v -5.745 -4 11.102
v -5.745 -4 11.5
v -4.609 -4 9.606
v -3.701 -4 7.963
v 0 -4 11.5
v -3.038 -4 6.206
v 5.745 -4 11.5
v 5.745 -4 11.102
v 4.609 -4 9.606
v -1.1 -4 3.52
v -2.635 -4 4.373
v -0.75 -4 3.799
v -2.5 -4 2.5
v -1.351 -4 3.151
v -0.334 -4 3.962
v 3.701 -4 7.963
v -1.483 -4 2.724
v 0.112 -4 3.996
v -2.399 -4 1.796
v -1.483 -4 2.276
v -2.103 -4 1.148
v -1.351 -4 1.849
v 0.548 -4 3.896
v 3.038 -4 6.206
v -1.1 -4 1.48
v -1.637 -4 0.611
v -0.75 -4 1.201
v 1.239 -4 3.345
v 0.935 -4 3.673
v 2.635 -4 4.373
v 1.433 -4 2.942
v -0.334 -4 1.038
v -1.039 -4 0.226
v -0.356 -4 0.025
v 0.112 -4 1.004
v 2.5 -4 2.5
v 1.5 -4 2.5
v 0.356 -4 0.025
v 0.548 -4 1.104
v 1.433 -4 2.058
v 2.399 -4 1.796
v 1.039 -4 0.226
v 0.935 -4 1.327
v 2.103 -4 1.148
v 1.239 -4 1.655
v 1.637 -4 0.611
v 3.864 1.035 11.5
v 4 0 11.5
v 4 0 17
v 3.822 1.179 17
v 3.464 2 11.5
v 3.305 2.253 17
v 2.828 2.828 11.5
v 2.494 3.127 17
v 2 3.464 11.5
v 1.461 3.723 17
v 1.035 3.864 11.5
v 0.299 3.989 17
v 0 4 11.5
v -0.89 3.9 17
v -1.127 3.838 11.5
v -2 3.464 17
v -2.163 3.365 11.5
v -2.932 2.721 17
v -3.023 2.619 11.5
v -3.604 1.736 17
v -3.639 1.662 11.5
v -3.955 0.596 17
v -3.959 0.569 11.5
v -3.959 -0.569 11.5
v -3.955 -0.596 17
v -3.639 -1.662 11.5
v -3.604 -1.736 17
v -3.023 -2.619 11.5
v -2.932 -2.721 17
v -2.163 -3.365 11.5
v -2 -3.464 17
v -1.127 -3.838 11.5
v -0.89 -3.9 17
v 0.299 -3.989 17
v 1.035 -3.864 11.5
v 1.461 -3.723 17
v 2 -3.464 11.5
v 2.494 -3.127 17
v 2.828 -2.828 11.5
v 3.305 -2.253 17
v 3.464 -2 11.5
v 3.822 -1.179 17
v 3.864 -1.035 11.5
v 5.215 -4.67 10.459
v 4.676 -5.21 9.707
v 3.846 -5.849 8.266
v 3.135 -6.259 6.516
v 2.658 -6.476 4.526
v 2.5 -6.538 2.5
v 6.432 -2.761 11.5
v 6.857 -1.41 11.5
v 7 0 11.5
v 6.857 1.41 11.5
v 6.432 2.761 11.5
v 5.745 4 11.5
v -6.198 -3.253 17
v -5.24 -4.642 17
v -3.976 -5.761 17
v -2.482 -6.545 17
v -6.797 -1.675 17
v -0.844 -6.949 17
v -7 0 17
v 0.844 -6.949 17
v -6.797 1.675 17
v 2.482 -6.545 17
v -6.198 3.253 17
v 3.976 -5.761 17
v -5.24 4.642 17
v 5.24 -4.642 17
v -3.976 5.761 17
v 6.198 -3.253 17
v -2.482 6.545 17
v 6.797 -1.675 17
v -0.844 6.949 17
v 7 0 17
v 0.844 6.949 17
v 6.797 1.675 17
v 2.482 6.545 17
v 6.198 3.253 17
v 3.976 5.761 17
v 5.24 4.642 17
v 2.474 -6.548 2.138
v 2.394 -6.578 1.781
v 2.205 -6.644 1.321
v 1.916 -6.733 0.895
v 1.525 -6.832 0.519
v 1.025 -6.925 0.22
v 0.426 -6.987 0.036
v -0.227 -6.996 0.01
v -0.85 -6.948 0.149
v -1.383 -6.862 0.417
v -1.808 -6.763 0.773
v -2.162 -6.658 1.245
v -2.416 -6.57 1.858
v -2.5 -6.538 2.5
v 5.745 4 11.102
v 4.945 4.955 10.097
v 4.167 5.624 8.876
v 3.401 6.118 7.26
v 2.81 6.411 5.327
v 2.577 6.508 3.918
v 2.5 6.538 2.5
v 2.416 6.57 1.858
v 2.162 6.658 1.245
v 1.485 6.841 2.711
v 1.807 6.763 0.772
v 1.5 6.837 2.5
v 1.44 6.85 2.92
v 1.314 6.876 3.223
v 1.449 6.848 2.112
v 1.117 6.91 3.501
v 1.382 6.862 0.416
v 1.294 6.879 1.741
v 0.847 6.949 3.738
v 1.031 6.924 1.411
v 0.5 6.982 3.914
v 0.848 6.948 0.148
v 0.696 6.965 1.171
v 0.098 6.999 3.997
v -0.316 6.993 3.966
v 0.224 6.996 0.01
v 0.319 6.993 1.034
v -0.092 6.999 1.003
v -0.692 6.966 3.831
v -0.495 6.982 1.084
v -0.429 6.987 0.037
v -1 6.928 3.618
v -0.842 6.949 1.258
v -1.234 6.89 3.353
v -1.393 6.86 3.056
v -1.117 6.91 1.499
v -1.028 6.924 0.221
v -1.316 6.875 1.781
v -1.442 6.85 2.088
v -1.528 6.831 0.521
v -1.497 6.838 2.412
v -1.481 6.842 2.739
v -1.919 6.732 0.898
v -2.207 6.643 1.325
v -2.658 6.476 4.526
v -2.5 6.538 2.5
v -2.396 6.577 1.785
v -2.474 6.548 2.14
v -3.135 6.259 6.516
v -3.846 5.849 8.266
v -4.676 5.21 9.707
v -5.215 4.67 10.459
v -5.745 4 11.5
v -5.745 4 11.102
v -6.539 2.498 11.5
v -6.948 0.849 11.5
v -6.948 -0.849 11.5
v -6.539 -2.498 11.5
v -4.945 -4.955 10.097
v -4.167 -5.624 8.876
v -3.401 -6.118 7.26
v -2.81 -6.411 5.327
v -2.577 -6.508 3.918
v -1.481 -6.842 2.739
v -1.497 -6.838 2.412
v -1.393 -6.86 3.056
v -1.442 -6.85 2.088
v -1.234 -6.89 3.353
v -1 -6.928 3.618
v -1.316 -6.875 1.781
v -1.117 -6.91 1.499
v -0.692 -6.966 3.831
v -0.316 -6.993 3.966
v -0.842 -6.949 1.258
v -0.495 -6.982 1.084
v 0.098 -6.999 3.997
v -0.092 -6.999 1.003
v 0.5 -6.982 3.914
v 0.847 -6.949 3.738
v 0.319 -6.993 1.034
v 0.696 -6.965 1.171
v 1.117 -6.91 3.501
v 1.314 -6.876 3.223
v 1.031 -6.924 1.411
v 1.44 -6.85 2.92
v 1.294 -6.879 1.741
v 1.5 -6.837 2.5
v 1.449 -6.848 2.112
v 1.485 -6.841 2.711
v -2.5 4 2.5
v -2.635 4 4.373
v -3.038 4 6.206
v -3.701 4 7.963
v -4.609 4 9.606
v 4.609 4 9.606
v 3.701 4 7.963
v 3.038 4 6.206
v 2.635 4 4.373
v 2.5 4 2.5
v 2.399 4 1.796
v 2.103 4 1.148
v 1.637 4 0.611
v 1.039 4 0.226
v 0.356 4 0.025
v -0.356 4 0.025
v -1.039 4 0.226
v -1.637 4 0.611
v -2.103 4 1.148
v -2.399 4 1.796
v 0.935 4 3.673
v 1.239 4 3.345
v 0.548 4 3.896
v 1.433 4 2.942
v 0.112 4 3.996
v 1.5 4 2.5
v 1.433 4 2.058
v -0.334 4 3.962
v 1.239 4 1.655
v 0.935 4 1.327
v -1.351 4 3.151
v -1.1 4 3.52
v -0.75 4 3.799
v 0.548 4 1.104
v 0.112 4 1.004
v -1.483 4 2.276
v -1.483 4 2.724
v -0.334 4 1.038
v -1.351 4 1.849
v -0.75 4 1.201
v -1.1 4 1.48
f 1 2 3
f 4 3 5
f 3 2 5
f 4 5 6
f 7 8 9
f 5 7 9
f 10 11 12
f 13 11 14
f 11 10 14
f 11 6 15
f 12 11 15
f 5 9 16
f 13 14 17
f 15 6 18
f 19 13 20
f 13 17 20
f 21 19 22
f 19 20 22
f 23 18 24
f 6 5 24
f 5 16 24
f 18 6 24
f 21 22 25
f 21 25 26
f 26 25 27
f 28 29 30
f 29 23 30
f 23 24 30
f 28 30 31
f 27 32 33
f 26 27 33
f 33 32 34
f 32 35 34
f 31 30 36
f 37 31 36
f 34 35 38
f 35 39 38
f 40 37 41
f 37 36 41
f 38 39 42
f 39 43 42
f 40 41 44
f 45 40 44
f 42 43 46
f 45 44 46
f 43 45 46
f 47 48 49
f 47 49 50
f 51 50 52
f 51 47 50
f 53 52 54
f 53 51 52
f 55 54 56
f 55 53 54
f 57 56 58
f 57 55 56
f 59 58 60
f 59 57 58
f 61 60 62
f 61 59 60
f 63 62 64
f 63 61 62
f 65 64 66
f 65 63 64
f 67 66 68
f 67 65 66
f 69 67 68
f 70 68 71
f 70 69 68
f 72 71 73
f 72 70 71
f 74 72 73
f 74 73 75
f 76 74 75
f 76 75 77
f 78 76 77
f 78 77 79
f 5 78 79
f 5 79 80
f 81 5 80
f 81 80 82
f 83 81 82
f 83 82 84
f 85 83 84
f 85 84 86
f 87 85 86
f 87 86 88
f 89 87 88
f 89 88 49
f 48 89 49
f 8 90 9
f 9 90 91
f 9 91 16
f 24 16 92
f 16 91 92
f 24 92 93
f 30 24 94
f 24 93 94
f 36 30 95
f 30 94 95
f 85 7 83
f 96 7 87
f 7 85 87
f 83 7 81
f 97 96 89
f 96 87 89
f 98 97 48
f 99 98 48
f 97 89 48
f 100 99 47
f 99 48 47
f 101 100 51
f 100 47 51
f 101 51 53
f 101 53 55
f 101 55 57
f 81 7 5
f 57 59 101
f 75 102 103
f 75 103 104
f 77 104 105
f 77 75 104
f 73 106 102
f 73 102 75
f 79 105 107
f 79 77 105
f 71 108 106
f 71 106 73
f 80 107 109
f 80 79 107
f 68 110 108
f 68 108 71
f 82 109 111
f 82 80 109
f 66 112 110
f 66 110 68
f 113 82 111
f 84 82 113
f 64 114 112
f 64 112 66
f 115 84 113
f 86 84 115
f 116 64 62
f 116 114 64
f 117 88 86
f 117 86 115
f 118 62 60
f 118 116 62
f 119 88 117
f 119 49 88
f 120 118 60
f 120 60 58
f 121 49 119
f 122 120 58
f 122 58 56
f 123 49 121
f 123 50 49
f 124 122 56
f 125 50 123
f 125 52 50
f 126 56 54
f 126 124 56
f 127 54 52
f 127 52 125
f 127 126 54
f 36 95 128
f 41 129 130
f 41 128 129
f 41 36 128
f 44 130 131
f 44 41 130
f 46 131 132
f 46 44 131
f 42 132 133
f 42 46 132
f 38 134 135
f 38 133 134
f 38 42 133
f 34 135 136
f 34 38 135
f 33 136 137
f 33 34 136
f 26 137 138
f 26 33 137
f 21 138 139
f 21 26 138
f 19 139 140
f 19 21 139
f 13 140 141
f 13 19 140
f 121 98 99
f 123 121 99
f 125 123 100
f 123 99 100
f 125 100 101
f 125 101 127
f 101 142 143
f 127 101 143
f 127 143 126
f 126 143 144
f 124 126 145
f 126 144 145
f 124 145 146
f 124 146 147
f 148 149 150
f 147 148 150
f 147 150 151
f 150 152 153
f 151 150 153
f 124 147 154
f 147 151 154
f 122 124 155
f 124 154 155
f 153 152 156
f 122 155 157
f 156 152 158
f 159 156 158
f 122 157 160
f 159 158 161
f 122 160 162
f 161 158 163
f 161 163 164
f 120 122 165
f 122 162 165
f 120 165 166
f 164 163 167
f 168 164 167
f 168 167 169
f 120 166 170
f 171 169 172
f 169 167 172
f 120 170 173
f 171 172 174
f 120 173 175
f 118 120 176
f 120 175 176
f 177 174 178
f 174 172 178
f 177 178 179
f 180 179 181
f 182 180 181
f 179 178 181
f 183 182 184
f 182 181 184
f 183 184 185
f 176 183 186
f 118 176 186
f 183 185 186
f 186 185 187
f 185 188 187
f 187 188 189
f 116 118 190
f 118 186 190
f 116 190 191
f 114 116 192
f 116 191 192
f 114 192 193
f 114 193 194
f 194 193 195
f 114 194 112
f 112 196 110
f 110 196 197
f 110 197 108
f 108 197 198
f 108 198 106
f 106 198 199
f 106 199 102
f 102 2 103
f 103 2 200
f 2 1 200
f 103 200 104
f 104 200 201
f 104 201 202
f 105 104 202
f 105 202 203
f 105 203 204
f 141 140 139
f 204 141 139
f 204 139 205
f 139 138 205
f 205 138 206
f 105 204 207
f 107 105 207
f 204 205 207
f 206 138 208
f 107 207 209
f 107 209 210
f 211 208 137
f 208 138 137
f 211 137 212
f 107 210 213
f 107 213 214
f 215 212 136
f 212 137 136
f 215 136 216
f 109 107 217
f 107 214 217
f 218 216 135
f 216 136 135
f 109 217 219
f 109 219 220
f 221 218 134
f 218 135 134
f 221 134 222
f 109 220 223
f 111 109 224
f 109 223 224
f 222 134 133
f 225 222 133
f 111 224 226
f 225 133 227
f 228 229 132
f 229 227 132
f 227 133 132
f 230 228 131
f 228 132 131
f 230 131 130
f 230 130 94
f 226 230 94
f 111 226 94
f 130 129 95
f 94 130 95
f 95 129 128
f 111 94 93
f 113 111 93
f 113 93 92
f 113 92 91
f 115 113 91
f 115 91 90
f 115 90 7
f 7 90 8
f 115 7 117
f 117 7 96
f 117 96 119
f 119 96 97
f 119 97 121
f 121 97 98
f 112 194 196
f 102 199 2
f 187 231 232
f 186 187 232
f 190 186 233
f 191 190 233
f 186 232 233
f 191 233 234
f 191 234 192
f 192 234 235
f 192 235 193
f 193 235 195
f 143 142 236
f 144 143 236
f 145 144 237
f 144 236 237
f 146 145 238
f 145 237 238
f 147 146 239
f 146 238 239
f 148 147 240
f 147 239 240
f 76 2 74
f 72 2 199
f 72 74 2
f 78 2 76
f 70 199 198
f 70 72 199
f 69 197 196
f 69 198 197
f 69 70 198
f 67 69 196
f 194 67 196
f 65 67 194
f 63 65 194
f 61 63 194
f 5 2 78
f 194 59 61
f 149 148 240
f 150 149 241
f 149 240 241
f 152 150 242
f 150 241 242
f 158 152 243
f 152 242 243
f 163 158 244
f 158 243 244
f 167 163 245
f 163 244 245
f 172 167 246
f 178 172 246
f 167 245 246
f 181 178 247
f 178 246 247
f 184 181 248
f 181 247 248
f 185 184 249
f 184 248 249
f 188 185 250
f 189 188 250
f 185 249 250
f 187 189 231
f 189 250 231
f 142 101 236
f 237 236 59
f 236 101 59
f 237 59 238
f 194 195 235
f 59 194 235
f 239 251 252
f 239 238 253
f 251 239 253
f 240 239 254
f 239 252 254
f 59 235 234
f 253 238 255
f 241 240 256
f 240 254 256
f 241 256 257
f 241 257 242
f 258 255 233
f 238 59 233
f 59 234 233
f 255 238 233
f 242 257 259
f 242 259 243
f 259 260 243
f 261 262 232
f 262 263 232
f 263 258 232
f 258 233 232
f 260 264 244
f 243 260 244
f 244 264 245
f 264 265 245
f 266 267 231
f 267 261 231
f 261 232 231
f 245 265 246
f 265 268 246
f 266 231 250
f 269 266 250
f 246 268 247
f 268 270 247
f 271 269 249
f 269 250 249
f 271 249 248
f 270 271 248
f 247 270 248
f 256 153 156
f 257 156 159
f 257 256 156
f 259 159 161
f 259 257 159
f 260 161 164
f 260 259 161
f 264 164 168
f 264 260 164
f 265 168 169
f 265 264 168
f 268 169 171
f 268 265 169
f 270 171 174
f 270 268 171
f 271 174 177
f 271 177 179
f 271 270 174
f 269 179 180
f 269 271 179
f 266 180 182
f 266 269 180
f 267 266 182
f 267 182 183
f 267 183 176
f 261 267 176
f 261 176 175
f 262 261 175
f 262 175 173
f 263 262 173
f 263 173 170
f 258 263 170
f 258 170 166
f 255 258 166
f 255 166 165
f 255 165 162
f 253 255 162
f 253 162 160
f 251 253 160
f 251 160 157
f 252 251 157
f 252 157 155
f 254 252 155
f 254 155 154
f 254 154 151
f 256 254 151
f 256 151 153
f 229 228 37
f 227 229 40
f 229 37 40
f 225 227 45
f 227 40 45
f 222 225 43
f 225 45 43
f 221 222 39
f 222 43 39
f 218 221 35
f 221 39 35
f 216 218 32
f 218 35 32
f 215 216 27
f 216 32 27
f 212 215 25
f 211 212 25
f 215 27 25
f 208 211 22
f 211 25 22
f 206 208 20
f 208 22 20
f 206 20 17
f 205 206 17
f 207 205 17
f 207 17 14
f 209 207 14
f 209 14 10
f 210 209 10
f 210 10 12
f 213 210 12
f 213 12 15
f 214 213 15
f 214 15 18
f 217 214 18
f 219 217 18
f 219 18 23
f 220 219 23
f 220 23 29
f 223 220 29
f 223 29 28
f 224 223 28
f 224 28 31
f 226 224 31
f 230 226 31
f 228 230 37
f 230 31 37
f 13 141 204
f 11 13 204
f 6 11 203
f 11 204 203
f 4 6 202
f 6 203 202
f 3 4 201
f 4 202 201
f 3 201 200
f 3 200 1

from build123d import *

# Parameters (mm, degrees)
SKETCH1_R               = 7
SKETCH1_R_2             = 4
BOSS_EXTRUDE1_DEPTH     = 17
SKETCH2_R               = 1.5
CUT_EXTRUDE1_DEPTH      = 8
CUT_EXTRUDE1_DEPTH_BACK = 8
SKETCH3_W               = 11.5
SKETCH3_H               = 8
CUT_EXTRUDE2_DEPTH      = 8.0000001
CUT_EXTRUDE2_DEPTH_BACK = 8.0000001


with BuildPart() as part:
    # Sketch1 → Boss-Extrude1 (new body)
    with BuildSketch(Plane.XY):
        Circle(SKETCH1_R)
        Circle(SKETCH1_R_2, mode=Mode.SUBTRACT)
    extrude(amount=BOSS_EXTRUDE1_DEPTH)

    # Sketch2 → Cut-Extrude1 (cut, two sides)
    with BuildSketch(Plane(origin=(0, 0, 0), x_dir=(1, 0, 0), z_dir=(0, 1, 0))) as cut_extrude1_sk:
        with Locations((0, -2.5)):
            Circle(SKETCH2_R)
        with BuildLine():
            Line((-7, -11.5), (-7, 0))
            Line((-7, 0), (0, 1))
            Line((0, 1), (7, 0))
            Line((7, 0), (7, -11.5))
            Line((7, -11.5), (6.109441797, -11.5))
            ThreePointArc((6.109441797, -11.5), (3.435990323, -7.348403606), (2.5, -2.5))
            ThreePointArc((2.5, -2.5), (0, 0), (-2.5, -2.5))
            ThreePointArc((-2.5, -2.5), (-3.435990323, -7.348403606), (-6.109441797, -11.5))
            Line((-6.109441797, -11.5), (-7, -11.5))
        make_face()
    extrude(amount=CUT_EXTRUDE1_DEPTH, mode=Mode.SUBTRACT)
    extrude(cut_extrude1_sk.sketch, amount=-CUT_EXTRUDE1_DEPTH_BACK, mode=Mode.SUBTRACT)

    # Sketch3 → Cut-Extrude2 (cut, two sides)
    with BuildSketch(Plane(origin=(0, 0, 0), x_dir=(0, 0, -1), z_dir=(1, 0, 0))) as cut_extrude2_sk:
        with Locations((-5.75, 0)):
            Rectangle(SKETCH3_W, SKETCH3_H)
    extrude(amount=CUT_EXTRUDE2_DEPTH, mode=Mode.SUBTRACT)
    extrude(cut_extrude2_sk.sketch, amount=-CUT_EXTRUDE2_DEPTH_BACK, mode=Mode.SUBTRACT)


solid = part.part
